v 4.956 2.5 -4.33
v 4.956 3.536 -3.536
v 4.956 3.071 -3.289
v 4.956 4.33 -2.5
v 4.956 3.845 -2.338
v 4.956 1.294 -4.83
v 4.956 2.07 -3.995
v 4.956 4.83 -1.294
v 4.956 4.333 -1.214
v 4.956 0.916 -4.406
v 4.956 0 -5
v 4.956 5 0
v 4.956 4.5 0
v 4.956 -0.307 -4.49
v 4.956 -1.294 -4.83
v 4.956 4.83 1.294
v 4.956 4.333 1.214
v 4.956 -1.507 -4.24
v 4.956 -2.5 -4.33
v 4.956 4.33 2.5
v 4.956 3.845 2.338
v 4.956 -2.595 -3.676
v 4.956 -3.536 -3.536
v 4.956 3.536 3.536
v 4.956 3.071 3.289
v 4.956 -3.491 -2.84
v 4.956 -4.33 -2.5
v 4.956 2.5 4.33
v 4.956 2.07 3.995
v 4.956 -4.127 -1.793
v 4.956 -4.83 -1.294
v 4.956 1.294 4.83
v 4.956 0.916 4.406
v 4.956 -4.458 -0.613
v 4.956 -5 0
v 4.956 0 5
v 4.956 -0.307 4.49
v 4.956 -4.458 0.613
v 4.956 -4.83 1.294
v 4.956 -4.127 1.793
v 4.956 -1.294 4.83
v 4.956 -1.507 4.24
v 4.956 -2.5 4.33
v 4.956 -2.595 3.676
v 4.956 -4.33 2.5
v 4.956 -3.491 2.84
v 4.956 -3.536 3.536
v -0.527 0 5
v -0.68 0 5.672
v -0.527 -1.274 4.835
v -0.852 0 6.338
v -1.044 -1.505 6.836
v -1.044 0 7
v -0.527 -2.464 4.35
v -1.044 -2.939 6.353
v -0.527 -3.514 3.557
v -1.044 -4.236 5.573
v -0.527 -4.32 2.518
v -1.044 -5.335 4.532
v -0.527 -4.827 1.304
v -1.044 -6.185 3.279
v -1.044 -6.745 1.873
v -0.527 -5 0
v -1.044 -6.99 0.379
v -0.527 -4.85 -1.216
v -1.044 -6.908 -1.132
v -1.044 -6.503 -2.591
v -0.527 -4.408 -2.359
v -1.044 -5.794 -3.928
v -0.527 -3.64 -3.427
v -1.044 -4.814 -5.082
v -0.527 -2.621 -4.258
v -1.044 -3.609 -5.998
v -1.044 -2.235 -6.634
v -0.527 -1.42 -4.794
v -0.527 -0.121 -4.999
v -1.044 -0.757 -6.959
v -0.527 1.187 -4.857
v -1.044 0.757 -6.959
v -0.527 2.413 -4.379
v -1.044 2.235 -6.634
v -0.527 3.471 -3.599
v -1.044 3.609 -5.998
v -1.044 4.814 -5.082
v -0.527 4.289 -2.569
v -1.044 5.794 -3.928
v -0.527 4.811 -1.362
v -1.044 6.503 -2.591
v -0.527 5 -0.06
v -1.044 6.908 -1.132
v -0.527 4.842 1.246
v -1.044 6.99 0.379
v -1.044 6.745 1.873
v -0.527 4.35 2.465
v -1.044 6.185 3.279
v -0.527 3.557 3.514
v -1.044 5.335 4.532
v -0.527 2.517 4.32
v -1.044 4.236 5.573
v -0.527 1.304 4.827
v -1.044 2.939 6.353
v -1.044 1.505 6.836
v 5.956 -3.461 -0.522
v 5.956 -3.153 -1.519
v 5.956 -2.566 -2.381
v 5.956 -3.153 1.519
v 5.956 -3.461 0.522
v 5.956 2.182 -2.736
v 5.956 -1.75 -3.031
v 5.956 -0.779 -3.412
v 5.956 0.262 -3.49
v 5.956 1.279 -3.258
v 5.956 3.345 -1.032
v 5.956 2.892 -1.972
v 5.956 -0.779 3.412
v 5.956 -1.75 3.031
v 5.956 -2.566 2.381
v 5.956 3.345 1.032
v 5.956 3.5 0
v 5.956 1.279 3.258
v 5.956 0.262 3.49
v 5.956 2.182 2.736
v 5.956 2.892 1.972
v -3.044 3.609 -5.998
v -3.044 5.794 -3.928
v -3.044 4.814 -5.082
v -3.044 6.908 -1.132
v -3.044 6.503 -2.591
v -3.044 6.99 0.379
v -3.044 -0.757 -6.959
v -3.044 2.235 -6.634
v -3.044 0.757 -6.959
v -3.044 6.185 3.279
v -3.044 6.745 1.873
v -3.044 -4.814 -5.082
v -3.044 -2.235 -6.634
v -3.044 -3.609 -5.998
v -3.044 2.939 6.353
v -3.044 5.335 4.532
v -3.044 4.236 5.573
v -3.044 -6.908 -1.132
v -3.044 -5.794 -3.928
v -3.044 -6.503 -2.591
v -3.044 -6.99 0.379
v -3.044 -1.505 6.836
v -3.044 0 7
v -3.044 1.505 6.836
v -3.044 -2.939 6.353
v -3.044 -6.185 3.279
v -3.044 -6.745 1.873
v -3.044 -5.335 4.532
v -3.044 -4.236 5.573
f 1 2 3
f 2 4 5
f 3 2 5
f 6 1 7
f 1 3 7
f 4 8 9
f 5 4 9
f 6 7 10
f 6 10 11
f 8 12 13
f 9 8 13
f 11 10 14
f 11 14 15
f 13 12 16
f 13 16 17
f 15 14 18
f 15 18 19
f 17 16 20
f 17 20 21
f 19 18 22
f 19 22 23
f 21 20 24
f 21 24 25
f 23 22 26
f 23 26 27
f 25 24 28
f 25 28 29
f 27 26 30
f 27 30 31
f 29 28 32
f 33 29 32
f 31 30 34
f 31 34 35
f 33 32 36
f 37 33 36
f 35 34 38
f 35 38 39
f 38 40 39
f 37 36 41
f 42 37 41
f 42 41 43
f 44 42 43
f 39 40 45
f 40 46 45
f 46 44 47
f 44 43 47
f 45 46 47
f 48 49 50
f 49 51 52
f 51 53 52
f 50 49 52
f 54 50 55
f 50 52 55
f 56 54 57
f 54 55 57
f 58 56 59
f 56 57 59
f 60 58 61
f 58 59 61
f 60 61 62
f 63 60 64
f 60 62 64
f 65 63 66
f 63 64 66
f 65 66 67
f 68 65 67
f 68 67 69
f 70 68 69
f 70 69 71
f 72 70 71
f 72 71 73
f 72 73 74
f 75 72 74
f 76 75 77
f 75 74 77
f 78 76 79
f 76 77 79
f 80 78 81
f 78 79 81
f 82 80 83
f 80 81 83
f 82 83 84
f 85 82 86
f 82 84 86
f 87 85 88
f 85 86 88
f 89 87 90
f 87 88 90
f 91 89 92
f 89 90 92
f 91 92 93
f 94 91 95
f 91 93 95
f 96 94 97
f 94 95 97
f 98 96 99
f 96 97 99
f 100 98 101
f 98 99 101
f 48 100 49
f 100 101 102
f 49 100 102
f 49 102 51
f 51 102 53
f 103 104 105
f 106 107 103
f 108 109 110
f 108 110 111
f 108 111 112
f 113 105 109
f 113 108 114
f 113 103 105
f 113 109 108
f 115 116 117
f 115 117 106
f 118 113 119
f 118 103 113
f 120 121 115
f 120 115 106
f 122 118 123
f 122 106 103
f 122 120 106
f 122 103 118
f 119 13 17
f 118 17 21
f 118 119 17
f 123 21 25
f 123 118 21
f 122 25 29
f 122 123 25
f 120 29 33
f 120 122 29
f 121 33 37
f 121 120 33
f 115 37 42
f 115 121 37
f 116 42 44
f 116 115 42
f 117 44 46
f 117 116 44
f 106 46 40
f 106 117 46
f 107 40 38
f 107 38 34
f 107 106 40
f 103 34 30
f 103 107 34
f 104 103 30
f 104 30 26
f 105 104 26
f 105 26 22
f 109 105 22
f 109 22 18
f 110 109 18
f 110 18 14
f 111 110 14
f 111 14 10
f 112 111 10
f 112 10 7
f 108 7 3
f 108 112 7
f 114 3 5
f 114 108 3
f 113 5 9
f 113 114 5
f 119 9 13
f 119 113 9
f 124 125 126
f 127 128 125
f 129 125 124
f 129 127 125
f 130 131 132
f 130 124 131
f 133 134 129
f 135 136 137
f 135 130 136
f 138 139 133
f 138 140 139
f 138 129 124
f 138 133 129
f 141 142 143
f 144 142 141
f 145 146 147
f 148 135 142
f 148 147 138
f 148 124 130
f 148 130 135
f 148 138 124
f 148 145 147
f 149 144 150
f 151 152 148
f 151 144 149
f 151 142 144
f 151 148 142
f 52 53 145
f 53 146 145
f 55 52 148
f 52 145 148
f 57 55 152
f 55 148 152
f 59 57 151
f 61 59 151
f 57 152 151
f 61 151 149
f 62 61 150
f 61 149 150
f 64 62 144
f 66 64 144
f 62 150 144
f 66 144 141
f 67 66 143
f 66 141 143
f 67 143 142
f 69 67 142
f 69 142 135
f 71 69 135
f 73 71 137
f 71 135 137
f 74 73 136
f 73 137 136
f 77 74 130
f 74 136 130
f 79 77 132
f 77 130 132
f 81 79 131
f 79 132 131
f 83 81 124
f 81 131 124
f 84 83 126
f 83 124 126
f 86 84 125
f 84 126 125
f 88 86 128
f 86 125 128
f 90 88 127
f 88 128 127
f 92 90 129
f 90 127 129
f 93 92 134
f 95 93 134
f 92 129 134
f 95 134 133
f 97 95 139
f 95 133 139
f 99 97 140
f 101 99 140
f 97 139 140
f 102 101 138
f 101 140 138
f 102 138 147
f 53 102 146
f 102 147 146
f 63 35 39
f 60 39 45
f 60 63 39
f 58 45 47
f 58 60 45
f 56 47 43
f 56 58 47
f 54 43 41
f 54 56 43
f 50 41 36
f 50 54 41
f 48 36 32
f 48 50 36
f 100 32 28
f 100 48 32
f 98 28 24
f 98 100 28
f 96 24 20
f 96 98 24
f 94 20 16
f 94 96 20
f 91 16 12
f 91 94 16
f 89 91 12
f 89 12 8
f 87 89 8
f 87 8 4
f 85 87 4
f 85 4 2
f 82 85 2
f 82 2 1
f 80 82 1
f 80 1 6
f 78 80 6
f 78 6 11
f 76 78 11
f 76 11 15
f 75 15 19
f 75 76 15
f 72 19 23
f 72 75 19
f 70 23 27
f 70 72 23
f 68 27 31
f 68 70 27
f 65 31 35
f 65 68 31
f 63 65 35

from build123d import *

# Parameters (mm, degrees)
F2_R     = 5
F3_DEPTH = 8
F4_R     = 4.5
F5_DEPTH = 1
F6_SIZE  = 0.99999


# Not quite as in the source:
# - a fillet or chamfer is up to 0.001 mm smaller than in the source, because OpenCascade refuses the exact size


with BuildPart() as f1:
    # F0 (on Front) → F1 (revolve)
    with BuildSketch(Plane.XZ):
        with BuildLine():
            Line((-3.0435194335, 0), (0, 0))
            ThreePointArc((0, 0), (-0.2623133647, 3.5386767586), (-1.0435194335, 7))
            Line((-1.0435194335, 7), (-3.0435194335, 7))
            Line((-3.0435194335, 7), (-3.0435194335, 0))
        make_face()
    revolve(axis=Axis((-1.5217597168, 0, 0), (1, 0, 0)))

    # F2 (on face) → F3 (join)
    with BuildSketch(Plane(origin=(-3.0435194335, 0, 0), x_dir=(0, -1, 0), z_dir=(-1, 0, 0))):
        Circle(F2_R)
    extrude(amount=-F3_DEPTH)

    # F4 (on face) → F5 (join)
    with BuildSketch(Plane.YZ.offset(4.9564805665)):
        Circle(F4_R)
    extrude(amount=F5_DEPTH)

    # F6 (size 1 in the source; OpenCascade refuses exactly that, so slightly less here)
    f6_edges = [f1.edges().sort_by_distance(p)[0] for p in [
        (5.956481, -4.5, 0),
    ]]
    chamfer(f6_edges, length=F6_SIZE)


solid = f1.part
